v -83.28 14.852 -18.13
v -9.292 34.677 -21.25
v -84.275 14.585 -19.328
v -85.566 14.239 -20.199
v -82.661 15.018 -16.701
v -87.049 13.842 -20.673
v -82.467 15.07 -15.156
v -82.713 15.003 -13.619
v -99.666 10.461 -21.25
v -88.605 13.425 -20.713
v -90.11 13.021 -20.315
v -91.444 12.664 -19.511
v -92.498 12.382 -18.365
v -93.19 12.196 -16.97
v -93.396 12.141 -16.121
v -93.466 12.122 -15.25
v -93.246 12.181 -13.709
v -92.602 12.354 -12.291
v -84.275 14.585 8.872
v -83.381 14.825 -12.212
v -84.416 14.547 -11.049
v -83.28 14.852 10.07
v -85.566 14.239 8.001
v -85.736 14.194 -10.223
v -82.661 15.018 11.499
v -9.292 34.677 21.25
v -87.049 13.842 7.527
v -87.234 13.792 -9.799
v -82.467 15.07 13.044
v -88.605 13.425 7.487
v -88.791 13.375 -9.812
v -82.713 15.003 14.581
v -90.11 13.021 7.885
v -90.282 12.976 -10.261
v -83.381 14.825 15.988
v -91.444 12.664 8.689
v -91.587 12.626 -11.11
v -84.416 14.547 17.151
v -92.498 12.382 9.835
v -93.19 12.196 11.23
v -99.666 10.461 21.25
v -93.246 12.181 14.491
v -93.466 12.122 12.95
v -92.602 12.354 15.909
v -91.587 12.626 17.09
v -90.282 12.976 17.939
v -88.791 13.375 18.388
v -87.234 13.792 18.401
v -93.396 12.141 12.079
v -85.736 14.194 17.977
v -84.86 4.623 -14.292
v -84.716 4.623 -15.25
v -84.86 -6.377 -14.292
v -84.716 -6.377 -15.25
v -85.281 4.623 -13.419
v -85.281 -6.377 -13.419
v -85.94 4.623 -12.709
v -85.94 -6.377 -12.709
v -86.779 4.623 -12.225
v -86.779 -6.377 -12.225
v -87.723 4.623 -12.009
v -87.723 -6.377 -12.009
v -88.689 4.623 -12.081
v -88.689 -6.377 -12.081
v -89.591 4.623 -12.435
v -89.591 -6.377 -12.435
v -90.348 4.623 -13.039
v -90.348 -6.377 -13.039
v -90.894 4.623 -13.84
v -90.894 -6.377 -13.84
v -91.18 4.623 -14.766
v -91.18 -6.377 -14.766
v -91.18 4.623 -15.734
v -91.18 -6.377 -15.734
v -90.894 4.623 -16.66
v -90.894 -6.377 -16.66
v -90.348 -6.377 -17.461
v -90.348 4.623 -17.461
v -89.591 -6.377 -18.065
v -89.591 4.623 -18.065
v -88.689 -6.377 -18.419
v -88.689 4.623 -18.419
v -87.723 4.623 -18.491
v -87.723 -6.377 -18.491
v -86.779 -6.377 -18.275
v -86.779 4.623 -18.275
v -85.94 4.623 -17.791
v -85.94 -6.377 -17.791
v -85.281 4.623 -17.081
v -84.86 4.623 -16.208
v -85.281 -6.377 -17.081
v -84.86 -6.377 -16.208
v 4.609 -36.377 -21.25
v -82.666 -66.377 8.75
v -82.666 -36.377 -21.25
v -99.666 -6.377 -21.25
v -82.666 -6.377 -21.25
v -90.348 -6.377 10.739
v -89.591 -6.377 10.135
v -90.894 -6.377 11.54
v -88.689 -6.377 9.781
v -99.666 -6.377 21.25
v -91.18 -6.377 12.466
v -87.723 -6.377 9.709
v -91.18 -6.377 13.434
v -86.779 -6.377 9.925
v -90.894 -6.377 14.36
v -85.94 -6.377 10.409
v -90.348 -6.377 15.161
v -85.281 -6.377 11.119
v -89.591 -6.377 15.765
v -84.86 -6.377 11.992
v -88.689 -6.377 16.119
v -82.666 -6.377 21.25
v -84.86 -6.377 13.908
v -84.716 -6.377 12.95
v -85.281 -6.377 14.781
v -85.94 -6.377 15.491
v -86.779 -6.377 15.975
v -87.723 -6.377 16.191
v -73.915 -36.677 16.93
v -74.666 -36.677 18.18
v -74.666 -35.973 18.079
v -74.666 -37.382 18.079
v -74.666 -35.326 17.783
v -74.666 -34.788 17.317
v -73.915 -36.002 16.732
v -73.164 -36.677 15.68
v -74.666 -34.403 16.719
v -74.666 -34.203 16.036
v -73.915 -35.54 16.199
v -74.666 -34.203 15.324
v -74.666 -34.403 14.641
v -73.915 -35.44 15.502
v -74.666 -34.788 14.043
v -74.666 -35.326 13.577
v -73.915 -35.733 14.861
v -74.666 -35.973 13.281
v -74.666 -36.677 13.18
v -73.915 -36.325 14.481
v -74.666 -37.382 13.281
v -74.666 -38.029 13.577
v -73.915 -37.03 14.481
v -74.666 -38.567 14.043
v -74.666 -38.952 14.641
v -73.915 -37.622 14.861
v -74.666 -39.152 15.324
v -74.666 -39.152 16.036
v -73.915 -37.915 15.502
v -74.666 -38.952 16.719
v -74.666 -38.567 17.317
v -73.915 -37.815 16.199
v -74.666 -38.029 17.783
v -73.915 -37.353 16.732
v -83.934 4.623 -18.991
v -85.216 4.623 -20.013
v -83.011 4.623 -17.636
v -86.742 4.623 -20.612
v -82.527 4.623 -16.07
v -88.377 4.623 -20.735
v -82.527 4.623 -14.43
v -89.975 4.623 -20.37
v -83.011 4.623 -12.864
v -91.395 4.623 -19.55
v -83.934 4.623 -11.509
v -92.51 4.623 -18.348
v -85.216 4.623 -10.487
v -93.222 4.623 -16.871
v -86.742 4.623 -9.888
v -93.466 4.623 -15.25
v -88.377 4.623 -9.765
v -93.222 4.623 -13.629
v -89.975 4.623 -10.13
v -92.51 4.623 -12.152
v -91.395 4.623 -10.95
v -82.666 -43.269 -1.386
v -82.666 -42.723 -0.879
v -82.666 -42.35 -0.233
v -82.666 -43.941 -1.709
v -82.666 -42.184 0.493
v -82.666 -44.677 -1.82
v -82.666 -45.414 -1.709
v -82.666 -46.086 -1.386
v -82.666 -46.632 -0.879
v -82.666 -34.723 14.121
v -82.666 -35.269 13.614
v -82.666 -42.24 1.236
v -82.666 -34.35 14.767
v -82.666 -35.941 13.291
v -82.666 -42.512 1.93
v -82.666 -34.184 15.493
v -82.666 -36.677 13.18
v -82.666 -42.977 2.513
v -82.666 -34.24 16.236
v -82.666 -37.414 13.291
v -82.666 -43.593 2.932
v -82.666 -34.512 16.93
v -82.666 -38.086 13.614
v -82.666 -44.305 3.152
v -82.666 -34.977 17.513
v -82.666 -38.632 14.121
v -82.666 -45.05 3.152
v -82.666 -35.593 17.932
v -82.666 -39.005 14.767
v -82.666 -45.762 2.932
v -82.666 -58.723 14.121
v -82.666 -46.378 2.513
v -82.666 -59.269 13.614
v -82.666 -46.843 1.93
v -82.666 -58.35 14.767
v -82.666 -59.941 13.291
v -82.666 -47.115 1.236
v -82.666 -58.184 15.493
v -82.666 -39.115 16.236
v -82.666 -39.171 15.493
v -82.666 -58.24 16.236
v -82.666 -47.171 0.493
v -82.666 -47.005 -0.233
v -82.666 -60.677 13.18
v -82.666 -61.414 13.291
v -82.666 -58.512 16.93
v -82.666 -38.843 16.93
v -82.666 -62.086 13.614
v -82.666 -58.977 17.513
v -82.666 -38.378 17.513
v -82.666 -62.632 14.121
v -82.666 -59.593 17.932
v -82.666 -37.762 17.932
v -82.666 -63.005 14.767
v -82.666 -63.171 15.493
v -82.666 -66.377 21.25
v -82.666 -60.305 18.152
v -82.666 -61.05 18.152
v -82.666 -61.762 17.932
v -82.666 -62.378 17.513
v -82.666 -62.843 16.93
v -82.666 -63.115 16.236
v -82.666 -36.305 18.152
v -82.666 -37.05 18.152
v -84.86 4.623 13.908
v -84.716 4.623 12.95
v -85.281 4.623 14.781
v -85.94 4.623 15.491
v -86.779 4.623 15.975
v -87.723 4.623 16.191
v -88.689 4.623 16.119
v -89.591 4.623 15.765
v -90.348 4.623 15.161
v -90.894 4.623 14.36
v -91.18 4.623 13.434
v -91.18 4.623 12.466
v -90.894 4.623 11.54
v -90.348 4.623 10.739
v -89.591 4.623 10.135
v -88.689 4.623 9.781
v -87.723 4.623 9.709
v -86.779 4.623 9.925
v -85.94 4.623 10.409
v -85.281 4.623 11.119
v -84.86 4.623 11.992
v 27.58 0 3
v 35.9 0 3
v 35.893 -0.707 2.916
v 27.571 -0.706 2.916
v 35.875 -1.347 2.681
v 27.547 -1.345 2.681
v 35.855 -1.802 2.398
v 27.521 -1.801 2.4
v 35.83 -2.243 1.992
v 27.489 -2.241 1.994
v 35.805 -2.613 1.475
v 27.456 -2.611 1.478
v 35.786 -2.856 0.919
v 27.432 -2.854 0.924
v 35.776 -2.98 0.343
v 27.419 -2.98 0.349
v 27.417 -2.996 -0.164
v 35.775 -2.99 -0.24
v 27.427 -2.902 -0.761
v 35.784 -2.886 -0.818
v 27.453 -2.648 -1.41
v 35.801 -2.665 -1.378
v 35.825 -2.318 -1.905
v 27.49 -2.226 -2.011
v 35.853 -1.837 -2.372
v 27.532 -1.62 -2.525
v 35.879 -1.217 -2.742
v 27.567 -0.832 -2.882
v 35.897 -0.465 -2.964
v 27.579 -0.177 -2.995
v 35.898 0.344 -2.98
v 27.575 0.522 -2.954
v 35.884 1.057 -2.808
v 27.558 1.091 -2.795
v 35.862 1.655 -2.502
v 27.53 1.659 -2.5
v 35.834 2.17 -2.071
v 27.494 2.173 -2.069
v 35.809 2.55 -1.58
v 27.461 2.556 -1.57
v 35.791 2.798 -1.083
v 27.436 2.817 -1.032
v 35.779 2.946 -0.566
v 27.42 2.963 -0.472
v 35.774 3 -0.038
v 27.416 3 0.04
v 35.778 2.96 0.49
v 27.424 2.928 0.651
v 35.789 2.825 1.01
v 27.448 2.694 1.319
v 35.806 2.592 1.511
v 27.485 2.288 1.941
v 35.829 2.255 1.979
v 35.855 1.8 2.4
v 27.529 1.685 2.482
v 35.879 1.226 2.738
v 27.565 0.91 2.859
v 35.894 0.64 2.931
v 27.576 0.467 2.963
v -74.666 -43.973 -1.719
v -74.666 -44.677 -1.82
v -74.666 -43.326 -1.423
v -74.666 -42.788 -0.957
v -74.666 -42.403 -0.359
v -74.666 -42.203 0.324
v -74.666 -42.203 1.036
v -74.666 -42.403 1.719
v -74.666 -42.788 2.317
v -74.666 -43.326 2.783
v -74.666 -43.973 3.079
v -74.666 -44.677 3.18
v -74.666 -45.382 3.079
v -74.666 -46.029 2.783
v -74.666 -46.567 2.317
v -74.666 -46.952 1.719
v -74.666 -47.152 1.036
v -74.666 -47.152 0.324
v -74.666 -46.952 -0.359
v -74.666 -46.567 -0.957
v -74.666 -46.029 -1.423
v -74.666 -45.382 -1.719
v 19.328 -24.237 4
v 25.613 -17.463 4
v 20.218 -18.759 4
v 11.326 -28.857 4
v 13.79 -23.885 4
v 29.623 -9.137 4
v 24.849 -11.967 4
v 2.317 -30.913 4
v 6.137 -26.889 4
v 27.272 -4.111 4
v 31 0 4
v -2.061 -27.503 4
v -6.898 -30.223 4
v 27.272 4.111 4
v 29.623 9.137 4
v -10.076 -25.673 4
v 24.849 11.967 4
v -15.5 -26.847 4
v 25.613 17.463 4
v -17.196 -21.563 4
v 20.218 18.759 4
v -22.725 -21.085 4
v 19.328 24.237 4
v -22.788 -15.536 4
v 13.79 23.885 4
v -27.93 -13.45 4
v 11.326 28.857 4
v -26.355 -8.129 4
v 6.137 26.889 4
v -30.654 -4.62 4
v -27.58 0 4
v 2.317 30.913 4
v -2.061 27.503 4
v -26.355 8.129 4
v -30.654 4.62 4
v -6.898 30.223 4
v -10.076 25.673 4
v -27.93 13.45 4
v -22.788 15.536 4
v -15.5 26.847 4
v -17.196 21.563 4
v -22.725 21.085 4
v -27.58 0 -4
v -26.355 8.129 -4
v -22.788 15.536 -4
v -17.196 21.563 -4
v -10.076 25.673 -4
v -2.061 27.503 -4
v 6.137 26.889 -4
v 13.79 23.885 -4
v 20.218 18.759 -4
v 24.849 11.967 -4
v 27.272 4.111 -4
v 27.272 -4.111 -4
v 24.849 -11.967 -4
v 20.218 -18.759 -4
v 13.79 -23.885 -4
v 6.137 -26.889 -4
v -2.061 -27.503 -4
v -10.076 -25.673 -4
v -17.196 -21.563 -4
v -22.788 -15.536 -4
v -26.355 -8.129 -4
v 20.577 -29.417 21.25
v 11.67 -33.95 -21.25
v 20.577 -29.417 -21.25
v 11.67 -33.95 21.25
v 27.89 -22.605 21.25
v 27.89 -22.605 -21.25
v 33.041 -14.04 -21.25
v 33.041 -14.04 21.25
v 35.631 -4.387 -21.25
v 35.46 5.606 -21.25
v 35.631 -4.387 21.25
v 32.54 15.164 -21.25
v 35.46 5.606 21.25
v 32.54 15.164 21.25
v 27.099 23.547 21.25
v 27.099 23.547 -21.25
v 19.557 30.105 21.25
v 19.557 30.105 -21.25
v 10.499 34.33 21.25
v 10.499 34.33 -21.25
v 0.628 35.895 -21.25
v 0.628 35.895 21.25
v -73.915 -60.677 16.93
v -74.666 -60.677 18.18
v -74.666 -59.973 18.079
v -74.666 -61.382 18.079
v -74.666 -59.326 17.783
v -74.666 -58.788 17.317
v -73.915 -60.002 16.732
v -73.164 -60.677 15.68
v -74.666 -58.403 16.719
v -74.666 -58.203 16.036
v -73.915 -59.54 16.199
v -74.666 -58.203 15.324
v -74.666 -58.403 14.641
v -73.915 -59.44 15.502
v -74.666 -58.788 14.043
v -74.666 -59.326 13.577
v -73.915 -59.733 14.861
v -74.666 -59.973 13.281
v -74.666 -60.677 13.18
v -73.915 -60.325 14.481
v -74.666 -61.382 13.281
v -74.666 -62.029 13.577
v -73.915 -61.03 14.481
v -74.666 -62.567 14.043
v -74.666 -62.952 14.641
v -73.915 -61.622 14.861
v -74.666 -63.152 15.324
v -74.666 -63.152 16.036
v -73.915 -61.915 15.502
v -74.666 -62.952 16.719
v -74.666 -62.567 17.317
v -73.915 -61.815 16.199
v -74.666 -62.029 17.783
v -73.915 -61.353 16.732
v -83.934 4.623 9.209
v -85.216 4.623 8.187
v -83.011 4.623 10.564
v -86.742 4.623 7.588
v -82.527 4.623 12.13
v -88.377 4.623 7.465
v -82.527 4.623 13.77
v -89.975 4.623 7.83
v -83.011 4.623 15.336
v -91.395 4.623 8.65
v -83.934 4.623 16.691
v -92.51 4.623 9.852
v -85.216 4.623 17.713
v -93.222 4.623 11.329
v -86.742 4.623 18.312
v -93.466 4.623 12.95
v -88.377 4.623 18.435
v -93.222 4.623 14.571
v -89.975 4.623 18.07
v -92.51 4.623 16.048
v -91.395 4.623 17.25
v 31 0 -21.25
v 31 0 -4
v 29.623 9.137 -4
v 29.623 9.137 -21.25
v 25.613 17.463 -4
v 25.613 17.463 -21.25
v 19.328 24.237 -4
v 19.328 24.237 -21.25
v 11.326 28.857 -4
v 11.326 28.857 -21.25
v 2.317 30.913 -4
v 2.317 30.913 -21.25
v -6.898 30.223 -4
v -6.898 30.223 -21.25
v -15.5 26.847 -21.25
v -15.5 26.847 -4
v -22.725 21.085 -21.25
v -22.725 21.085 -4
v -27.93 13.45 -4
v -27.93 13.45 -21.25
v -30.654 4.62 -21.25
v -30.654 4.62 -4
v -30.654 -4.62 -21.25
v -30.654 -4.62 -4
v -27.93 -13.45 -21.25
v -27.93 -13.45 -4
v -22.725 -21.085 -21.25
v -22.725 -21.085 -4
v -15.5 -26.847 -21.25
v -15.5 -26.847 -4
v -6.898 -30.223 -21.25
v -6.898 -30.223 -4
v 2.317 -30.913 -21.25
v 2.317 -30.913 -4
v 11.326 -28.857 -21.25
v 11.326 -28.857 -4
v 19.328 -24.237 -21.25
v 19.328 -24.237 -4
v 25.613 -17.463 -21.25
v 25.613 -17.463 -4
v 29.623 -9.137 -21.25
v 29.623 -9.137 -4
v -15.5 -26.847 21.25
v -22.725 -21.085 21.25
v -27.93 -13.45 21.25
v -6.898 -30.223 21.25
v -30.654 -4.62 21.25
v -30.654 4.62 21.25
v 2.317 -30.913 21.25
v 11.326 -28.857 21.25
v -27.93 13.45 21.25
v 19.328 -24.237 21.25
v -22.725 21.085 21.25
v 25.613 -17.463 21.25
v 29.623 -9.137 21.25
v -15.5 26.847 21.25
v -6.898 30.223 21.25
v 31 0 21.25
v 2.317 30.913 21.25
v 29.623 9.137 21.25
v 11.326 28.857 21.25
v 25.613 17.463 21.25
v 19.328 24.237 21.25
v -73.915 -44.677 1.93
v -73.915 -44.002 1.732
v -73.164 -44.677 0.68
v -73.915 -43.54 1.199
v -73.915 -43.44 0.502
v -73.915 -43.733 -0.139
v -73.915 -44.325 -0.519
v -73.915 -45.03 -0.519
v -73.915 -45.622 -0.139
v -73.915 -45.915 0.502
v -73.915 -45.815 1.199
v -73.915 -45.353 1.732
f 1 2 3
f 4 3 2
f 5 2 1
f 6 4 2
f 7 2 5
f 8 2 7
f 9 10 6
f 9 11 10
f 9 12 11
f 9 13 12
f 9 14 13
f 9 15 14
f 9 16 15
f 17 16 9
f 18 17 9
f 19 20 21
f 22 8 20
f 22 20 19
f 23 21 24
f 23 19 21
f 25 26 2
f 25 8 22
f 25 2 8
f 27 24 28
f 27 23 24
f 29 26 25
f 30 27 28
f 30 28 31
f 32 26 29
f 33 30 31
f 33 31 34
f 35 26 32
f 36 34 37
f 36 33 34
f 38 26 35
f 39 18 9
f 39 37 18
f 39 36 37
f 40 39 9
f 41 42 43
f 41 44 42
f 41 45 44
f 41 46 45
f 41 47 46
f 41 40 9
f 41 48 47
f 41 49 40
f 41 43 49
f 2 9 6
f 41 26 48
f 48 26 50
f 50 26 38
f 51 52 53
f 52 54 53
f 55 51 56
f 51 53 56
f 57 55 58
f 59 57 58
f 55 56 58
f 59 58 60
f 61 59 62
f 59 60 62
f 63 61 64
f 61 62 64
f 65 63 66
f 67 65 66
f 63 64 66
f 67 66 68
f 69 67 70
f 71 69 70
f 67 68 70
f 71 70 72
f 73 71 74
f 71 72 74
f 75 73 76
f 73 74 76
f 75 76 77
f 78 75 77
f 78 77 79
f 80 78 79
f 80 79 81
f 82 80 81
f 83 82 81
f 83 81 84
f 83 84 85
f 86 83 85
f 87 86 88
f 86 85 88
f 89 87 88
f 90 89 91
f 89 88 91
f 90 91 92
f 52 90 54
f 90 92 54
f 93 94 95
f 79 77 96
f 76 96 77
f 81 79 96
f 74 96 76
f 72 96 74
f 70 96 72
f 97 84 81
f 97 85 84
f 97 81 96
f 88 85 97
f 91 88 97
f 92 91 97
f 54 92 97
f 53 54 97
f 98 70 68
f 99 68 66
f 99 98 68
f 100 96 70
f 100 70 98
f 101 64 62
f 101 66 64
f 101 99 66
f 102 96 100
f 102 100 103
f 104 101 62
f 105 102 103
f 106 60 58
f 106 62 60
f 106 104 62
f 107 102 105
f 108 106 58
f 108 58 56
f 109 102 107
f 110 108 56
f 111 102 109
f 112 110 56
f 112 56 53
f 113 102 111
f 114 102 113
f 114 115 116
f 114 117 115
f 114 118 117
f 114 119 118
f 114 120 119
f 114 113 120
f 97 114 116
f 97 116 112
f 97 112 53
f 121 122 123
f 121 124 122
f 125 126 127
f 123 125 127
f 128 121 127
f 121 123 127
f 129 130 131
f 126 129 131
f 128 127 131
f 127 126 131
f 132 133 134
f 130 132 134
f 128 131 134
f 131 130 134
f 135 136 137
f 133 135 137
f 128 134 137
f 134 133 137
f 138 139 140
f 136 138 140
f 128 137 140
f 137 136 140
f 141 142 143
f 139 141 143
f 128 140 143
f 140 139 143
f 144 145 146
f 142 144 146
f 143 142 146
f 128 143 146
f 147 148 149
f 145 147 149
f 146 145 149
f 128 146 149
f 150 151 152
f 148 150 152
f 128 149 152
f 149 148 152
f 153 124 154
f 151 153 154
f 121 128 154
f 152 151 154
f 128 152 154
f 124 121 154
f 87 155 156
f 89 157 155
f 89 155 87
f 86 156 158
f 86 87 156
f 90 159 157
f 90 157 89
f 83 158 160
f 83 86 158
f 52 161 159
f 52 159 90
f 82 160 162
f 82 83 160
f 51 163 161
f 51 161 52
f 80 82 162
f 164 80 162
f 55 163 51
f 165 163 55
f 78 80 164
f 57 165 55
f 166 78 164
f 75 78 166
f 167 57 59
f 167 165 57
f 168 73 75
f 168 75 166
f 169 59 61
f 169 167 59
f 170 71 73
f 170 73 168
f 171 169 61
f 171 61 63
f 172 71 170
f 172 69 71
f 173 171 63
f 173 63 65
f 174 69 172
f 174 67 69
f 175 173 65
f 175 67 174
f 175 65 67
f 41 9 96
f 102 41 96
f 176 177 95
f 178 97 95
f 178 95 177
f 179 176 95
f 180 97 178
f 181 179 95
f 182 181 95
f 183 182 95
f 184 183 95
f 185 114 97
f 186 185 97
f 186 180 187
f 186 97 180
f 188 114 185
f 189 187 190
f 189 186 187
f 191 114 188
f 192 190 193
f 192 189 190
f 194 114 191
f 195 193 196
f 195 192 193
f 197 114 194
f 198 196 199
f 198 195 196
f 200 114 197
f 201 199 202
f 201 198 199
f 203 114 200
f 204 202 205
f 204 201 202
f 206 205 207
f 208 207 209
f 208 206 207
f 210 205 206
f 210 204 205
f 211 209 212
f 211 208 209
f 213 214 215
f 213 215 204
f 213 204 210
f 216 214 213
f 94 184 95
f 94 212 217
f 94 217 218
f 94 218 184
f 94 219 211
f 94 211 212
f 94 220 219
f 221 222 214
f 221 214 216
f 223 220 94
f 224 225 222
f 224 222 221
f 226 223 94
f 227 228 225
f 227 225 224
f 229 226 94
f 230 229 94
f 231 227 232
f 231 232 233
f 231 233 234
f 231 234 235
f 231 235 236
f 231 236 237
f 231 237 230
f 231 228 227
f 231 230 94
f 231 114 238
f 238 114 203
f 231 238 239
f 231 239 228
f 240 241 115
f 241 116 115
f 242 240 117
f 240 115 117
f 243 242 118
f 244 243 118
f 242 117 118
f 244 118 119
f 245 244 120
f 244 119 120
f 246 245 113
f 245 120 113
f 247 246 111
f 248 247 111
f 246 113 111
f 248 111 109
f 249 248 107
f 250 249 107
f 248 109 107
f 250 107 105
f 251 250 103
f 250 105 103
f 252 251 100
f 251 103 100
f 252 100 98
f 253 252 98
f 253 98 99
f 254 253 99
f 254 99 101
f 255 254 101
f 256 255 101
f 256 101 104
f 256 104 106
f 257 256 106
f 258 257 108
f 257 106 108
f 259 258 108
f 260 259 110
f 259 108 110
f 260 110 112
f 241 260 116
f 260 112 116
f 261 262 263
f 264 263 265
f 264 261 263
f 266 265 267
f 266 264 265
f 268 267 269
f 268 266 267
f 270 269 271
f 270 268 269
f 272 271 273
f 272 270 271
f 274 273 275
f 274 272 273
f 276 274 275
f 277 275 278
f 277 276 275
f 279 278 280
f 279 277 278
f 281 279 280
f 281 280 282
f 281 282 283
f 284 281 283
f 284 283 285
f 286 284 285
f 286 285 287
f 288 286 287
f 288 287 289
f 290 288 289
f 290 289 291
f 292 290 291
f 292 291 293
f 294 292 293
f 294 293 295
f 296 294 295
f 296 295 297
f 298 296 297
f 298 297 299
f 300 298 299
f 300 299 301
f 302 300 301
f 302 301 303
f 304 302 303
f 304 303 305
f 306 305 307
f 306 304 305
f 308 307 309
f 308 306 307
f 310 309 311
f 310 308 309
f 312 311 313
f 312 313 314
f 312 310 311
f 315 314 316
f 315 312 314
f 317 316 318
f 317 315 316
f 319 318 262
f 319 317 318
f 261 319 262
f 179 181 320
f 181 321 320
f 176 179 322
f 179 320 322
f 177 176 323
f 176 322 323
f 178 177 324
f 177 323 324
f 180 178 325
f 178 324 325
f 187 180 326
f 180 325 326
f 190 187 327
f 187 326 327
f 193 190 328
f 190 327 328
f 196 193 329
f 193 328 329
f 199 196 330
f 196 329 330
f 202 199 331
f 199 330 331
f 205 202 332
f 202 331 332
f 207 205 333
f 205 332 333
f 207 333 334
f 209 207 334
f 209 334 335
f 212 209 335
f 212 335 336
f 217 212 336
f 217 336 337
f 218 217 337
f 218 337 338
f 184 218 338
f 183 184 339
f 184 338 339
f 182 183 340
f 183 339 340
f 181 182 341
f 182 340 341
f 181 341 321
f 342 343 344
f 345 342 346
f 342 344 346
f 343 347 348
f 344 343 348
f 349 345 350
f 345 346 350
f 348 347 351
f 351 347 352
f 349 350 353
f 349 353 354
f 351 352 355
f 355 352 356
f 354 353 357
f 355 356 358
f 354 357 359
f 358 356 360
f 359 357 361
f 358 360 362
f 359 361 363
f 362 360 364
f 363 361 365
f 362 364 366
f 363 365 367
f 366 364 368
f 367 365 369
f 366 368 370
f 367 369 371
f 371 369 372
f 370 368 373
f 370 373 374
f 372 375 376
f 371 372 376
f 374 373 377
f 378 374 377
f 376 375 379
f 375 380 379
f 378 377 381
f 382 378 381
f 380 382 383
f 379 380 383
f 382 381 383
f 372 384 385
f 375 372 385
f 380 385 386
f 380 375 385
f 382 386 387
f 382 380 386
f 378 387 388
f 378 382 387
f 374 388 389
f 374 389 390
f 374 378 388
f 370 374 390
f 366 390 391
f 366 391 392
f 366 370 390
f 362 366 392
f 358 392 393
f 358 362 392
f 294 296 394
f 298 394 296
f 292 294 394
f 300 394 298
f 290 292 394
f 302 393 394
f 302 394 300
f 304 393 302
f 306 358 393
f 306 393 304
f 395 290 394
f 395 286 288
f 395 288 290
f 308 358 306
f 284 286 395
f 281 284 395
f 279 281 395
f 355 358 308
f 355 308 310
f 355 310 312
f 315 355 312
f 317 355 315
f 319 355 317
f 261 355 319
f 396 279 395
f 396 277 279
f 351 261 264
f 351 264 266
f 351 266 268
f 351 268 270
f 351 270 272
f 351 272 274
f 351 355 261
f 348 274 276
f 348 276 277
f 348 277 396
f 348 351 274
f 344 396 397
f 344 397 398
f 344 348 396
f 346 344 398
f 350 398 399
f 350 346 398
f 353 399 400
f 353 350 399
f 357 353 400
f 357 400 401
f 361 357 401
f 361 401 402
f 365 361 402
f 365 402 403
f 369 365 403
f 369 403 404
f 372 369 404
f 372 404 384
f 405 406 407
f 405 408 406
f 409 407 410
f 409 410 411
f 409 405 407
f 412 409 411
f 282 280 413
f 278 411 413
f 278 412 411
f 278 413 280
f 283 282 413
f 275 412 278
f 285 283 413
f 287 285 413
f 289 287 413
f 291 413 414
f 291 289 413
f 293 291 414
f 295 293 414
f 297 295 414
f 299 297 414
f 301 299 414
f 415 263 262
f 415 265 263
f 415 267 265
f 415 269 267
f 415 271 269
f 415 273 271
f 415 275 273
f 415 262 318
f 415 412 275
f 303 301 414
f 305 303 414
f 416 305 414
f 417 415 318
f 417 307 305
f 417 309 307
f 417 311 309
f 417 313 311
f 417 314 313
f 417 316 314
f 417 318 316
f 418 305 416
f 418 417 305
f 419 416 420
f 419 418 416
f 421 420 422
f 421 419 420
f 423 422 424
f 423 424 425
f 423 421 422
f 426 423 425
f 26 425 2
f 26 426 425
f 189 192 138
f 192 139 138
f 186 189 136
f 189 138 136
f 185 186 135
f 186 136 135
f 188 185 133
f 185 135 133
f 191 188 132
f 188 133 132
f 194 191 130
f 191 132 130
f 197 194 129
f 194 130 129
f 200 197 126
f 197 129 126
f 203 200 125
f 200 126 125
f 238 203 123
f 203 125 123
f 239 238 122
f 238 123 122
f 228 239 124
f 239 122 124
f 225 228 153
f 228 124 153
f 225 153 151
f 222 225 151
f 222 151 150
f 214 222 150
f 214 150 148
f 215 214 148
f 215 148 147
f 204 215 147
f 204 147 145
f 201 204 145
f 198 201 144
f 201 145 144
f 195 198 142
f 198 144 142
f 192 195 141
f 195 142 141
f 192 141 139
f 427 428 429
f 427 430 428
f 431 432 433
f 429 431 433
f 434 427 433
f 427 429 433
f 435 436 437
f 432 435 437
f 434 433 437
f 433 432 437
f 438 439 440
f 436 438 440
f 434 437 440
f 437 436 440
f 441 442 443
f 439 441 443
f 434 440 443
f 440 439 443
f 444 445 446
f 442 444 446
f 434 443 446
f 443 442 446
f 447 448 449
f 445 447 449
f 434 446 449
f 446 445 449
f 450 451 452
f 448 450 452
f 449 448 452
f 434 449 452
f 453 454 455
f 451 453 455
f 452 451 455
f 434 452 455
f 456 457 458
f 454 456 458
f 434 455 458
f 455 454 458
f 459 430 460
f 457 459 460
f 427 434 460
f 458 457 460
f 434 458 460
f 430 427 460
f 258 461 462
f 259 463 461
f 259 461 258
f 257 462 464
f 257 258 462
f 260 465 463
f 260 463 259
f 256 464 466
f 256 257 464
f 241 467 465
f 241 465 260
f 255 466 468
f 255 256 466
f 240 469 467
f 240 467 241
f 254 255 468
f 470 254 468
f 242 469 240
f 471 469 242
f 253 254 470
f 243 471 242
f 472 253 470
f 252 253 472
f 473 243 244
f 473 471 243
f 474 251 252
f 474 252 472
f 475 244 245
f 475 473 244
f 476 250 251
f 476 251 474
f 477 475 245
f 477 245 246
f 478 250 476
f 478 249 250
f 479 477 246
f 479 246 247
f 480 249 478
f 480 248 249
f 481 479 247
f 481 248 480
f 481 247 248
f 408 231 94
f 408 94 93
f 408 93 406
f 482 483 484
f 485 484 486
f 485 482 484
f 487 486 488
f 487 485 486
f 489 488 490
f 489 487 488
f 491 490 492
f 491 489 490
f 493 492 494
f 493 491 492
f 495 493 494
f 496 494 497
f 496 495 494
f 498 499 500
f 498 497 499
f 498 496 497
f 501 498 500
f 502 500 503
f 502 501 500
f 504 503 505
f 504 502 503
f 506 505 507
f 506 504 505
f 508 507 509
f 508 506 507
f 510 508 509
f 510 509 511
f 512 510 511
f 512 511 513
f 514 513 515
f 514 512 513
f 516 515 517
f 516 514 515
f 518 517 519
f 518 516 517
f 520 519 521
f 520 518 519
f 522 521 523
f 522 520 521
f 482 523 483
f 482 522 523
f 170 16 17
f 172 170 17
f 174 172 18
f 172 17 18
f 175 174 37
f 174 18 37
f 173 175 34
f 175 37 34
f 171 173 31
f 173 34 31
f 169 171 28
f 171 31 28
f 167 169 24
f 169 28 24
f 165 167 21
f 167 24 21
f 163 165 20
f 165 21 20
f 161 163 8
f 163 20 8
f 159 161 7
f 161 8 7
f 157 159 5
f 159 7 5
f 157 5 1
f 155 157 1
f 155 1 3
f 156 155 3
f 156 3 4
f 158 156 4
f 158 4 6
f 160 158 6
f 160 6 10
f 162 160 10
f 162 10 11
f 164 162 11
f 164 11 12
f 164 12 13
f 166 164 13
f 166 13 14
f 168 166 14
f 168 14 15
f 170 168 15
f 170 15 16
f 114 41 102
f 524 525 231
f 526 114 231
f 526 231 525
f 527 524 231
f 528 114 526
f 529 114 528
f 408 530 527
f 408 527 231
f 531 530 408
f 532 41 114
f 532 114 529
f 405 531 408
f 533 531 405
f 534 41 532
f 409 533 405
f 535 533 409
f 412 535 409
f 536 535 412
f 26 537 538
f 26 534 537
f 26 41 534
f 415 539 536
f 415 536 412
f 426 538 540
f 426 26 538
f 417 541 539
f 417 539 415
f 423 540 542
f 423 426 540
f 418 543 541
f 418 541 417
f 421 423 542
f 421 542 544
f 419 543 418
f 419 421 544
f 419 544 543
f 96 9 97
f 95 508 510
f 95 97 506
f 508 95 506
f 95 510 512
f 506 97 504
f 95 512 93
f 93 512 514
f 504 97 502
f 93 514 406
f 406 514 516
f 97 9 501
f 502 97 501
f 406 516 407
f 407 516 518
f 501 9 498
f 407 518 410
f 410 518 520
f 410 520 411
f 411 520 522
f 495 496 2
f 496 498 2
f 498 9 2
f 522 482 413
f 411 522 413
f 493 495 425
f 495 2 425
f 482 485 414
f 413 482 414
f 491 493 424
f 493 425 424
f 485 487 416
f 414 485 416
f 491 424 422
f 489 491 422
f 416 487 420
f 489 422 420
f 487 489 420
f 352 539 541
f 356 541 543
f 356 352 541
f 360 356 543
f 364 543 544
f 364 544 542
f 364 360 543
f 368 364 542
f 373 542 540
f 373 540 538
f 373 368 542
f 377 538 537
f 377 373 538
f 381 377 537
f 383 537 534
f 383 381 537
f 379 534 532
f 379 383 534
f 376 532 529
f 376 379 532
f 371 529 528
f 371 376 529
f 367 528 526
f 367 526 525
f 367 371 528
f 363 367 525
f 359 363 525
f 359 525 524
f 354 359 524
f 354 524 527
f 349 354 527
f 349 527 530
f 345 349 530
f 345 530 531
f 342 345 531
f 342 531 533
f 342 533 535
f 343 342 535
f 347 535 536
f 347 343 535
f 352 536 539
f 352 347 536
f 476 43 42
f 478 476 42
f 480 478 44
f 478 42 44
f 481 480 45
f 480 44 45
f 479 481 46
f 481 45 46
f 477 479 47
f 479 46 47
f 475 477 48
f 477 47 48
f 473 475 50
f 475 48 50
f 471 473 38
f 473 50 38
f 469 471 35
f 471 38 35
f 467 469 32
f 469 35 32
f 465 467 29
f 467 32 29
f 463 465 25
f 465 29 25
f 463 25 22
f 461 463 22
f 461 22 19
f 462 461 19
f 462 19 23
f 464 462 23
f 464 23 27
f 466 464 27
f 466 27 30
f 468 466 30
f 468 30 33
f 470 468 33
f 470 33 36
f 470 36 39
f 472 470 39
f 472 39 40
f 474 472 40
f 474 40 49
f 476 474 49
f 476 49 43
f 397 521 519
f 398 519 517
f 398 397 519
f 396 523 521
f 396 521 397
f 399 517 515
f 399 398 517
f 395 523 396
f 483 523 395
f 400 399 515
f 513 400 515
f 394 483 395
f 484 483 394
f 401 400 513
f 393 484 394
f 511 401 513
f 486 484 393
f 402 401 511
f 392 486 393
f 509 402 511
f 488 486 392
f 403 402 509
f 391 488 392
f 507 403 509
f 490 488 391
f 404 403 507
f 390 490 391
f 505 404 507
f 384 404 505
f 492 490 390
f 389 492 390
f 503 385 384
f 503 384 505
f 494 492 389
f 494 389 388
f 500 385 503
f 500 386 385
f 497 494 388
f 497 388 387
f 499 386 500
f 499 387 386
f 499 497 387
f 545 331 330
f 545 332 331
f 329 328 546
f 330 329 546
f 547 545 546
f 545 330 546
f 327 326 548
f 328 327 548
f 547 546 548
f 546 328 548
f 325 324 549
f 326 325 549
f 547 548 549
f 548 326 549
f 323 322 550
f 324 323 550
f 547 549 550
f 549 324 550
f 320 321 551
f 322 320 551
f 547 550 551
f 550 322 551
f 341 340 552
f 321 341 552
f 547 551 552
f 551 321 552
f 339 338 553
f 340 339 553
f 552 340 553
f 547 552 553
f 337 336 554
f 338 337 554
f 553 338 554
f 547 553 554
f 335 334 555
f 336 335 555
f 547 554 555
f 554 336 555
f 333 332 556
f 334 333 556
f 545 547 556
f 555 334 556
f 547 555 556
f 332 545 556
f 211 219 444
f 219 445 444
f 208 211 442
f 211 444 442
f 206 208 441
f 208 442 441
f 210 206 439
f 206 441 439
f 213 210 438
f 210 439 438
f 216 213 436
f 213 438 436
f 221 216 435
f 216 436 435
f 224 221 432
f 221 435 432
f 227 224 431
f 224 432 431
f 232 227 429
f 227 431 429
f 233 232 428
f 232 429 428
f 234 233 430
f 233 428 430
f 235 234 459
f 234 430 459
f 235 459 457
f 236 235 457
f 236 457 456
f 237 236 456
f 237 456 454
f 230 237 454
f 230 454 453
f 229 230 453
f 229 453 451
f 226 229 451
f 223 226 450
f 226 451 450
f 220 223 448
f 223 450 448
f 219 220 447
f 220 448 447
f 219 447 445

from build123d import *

# Parameters (mm, degrees)
SKETCH1_R                                    = 31
BOSS_EXTRUDE1_DEPTH                          = 21.25
CUT_EXTRUDE1_DEPTH                           = 91
F_5_0MM_DOWEL_HOLE1_D                        = 5
F_5_0MM_DOWEL_HOLE1_DEPTH                    = 8
F_5_0MM_DOWEL_HOLE1_TIP                      = 1.502151548
CBORE_FOR_M8_HEX_HEAD_CAP_SCREW2_D           = 6.5
CBORE_FOR_M8_HEX_HEAD_CAP_SCREW2_CBORE_D     = 11
CBORE_FOR_M8_HEX_HEAD_CAP_SCREW2_CBORE_DEPTH = 13
SKETCH18_R                                   = 31
SKETCH18_R_2                                 = 27.58
BOSS_EXTRUDE2_DEPTH                          = 4
SKETCH21_R                                   = 3
CUT_EXTRUDE2_DEPTH                           = 122.617548954


with BuildPart() as part:
    # Sketch1 → Boss-Extrude1 (new, symmetric)
    with BuildSketch(Plane.XY):
        with BuildLine():
            Line((-99.665912553, 10.461014095), (-99.665912553, -6.377493087))
            Line((-99.665912553, -6.377493087), (-82.665912553, -6.377493087))
            Line((-82.665912553, -6.377493087), (-82.665912553, -66.377493087))
            Line((-82.665912553, -66.377493087), (11.670122046, -33.950231979))
            ThreePointArc((11.670122046, -33.950231979), (34.334087447, 10.487155916), (-9.291603719, 34.676737164))
            Line((-9.291603719, 34.676737164), (-99.665912553, 10.461014095))
        make_face()
        Circle(SKETCH1_R, mode=Mode.SUBTRACT)
    extrude(amount=BOSS_EXTRUDE1_DEPTH, both=True)

    # Sketch5 → Cut-Extrude1 (cut)
    with BuildSketch(Plane.ZY.offset(82.665912553)):
        Polygon((-21.25, -66.377493087), (8.75, -66.377493087), (-21.25, -36.377493087), align=None)
    extrude(amount=-CUT_EXTRUDE1_DEPTH, mode=Mode.SUBTRACT)

    # Ø5.0mm Dowel Hole1
    with Locations(Plane.ZY.offset(82.665912553)):
        with Locations((15.68, -60.677493087), (15.68, -36.677493087), (-98.628383383, 36.760601071), (0.68, -44.677493087), (35.6, -82.217865389)):
            Hole(F_5_0MM_DOWEL_HOLE1_D / 2, depth=F_5_0MM_DOWEL_HOLE1_DEPTH)
            with Locations((0, 0, -(F_5_0MM_DOWEL_HOLE1_DEPTH + F_5_0MM_DOWEL_HOLE1_TIP / 2))):  # 118° drill point
                Cone(0, F_5_0MM_DOWEL_HOLE1_D / 2, F_5_0MM_DOWEL_HOLE1_TIP, mode=Mode.SUBTRACT)

    # CBORE for M8 Hex Head Cap Screw2 (through all)
    with Locations(Plane(origin=(0, 17.622506913, 0), x_dir=(-1, 0, 0), z_dir=(0, 1, 0))):
        with Locations((87.965912553, -15.25), (87.965912553, 12.95)):
            CounterBoreHole(CBORE_FOR_M8_HEX_HEAD_CAP_SCREW2_D / 2, CBORE_FOR_M8_HEX_HEAD_CAP_SCREW2_CBORE_D / 2, CBORE_FOR_M8_HEX_HEAD_CAP_SCREW2_CBORE_DEPTH)

    # Sketch18 → Boss-Extrude2 (add, symmetric)
    with BuildSketch(Plane(origin=(0, 0, 0), x_dir=(-1, 0, 0), z_dir=(0, 0, -1))):
        Circle(SKETCH18_R)
        Circle(SKETCH18_R_2, mode=Mode.SUBTRACT)
    extrude(amount=BOSS_EXTRUDE2_DEPTH, both=True)

    # Sketch21 → Cut-Extrude2 (cut, through all)
    with BuildSketch(Plane(origin=(0, 0, 0), x_dir=(0, 0, -1), z_dir=(1, 0, 0))):
        with Locations(Location((0, 0, 0), (0, 0, 180))):
            Circle(SKETCH21_R)
    extrude(amount=CUT_EXTRUDE2_DEPTH, mode=Mode.SUBTRACT)


solid = part.part
